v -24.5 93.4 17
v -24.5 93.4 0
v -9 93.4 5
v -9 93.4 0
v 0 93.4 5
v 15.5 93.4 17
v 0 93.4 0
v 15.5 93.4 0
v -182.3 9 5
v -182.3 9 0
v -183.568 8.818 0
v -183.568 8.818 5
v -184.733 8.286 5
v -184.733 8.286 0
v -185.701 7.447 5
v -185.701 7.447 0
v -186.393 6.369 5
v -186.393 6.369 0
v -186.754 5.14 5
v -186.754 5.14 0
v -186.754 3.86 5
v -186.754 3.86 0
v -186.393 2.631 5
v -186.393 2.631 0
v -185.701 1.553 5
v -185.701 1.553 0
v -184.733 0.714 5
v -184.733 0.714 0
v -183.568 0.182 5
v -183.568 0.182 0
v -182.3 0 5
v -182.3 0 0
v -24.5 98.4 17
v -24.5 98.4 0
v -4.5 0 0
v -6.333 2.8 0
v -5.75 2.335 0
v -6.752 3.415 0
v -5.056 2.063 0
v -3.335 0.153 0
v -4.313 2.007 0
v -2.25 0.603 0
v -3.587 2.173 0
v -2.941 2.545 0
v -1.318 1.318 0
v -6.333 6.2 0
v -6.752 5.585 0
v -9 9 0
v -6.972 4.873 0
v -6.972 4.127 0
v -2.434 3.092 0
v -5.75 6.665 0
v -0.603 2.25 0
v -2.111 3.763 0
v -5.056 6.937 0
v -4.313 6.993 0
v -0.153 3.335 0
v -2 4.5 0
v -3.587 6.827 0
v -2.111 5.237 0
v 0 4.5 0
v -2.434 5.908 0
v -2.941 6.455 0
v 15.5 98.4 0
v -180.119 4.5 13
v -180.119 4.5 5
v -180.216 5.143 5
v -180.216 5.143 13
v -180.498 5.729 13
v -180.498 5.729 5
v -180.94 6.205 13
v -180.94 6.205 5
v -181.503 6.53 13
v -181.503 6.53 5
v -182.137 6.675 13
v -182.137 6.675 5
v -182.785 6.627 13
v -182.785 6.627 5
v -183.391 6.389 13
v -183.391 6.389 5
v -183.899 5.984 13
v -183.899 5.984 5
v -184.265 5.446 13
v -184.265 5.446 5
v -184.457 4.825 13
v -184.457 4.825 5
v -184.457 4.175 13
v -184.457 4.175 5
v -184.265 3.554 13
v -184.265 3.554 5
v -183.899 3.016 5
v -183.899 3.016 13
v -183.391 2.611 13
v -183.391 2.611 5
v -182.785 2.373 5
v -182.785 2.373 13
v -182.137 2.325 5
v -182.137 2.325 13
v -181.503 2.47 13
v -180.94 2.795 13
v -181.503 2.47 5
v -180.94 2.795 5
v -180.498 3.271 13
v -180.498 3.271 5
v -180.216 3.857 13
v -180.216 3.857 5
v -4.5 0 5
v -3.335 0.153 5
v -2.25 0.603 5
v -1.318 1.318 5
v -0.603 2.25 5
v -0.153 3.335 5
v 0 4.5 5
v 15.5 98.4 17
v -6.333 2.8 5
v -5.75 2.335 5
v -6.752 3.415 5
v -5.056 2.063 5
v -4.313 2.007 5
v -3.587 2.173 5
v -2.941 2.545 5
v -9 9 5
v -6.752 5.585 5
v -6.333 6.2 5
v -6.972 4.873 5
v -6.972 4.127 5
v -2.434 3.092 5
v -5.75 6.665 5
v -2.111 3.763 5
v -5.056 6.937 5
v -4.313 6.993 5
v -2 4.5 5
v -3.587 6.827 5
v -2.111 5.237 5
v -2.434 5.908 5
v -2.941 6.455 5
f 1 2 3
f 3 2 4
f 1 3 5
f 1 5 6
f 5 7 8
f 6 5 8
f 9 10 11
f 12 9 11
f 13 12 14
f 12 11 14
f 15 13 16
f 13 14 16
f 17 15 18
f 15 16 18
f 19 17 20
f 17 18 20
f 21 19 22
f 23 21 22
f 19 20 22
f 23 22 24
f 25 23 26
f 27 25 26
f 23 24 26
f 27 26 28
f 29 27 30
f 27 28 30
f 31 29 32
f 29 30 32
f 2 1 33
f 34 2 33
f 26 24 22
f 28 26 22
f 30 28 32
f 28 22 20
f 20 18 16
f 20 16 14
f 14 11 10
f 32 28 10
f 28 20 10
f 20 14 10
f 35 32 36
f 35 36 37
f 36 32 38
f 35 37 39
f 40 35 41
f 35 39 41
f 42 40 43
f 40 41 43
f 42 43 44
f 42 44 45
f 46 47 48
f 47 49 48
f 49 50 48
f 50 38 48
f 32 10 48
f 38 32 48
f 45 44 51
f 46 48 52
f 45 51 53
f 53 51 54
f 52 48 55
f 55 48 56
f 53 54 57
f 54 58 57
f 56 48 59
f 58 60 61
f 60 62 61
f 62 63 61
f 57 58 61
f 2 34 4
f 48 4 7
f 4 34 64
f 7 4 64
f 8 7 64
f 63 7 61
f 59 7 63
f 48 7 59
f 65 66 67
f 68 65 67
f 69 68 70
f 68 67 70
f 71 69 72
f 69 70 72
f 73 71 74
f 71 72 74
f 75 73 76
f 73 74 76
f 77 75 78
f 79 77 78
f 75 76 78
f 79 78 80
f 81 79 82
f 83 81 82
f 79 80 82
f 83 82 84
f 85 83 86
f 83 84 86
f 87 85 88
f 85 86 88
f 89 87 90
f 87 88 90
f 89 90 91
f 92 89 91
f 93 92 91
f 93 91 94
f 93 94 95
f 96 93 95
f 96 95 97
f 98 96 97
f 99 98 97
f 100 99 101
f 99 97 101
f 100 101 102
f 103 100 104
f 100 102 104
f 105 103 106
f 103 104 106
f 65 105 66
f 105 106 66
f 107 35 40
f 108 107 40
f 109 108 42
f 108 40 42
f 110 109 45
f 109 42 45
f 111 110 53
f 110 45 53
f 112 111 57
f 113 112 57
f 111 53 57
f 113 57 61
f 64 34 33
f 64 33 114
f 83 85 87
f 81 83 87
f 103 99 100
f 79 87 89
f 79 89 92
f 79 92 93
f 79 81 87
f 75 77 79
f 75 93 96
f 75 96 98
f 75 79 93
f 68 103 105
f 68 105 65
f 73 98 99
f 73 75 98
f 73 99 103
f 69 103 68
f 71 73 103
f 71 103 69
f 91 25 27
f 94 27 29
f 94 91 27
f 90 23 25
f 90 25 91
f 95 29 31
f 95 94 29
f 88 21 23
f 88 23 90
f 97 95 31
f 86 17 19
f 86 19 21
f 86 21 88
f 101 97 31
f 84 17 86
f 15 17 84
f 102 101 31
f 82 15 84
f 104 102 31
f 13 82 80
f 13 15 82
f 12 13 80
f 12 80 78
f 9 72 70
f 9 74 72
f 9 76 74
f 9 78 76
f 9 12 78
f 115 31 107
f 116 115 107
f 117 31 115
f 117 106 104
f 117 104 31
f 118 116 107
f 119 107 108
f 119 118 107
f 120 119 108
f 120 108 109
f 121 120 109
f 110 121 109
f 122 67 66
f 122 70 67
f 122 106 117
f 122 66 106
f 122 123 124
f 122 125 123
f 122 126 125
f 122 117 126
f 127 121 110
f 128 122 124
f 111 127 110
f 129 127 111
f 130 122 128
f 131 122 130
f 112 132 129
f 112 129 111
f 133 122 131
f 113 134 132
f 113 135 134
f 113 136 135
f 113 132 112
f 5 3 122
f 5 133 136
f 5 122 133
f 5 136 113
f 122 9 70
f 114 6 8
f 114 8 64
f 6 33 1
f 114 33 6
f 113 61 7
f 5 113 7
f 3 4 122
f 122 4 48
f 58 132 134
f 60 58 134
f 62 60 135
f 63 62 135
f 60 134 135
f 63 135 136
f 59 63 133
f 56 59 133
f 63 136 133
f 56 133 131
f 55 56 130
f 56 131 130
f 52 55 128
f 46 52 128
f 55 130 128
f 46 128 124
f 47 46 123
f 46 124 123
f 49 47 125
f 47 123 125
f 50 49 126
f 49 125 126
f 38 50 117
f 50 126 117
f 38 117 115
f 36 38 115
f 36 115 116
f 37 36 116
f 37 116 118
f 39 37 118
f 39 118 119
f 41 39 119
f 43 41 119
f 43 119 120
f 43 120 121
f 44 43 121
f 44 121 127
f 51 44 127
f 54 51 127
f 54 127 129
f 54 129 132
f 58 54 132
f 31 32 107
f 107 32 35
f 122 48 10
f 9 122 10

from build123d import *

# Parameters (mm, degrees)
F1_DEPTH = 5
F2_W     = 40
F2_H     = 5
F3_DEPTH = 12
F4_R     = 2.18125
F5_DEPTH = 8
F6_R     = 2.5
F7_DEPTH = 25


with BuildPart() as f1:
    # F0 (on Top) → F1 (new body)
    with BuildSketch(Plane.XY):
        with BuildLine():
            Line((15.5, 98.4), (-24.5, 98.4))
            Line((-24.5, 98.4), (-24.5, 93.4))
            Line((-24.5, 93.4), (-9, 93.4))
            Line((-9, 93.4), (-9, 9))
            Line((-9, 9), (-182.3, 9))
            ThreePointArc((-182.3, 9), (-186.8, 4.5), (-182.3, 0))
            Line((-182.3, 0), (-4.5, 0))
            ThreePointArc((-4.5, 0), (-1.318019, 1.318019), (0, 4.5))
            Line((0, 4.5), (0, 93.4))
            Line((0, 93.4), (15.5, 93.4))
            Line((15.5, 93.4), (15.5, 98.4))
        make_face()
    extrude(amount=F1_DEPTH)

    # F2 (on face) → F3 (join)
    with BuildSketch(Plane.XY.offset(5)):
        with Locations((-4.5, 95.9)):
            Rectangle(F2_W, F2_H)
    extrude(amount=F3_DEPTH)

    # F4 (on face) → F5 (join)
    with BuildSketch(Plane.XY.offset(5)):
        with Locations((-182.3, 4.5)):
            Circle(F4_R)
    extrude(amount=F5_DEPTH)

    # F6 (on face) → F7 (cut)
    with BuildSketch(Plane.XY.offset(5)):
        with Locations((-4.5, 4.5)):
            Circle(F6_R)
    extrude(amount=-F7_DEPTH, mode=Mode.SUBTRACT)


solid = f1.part
